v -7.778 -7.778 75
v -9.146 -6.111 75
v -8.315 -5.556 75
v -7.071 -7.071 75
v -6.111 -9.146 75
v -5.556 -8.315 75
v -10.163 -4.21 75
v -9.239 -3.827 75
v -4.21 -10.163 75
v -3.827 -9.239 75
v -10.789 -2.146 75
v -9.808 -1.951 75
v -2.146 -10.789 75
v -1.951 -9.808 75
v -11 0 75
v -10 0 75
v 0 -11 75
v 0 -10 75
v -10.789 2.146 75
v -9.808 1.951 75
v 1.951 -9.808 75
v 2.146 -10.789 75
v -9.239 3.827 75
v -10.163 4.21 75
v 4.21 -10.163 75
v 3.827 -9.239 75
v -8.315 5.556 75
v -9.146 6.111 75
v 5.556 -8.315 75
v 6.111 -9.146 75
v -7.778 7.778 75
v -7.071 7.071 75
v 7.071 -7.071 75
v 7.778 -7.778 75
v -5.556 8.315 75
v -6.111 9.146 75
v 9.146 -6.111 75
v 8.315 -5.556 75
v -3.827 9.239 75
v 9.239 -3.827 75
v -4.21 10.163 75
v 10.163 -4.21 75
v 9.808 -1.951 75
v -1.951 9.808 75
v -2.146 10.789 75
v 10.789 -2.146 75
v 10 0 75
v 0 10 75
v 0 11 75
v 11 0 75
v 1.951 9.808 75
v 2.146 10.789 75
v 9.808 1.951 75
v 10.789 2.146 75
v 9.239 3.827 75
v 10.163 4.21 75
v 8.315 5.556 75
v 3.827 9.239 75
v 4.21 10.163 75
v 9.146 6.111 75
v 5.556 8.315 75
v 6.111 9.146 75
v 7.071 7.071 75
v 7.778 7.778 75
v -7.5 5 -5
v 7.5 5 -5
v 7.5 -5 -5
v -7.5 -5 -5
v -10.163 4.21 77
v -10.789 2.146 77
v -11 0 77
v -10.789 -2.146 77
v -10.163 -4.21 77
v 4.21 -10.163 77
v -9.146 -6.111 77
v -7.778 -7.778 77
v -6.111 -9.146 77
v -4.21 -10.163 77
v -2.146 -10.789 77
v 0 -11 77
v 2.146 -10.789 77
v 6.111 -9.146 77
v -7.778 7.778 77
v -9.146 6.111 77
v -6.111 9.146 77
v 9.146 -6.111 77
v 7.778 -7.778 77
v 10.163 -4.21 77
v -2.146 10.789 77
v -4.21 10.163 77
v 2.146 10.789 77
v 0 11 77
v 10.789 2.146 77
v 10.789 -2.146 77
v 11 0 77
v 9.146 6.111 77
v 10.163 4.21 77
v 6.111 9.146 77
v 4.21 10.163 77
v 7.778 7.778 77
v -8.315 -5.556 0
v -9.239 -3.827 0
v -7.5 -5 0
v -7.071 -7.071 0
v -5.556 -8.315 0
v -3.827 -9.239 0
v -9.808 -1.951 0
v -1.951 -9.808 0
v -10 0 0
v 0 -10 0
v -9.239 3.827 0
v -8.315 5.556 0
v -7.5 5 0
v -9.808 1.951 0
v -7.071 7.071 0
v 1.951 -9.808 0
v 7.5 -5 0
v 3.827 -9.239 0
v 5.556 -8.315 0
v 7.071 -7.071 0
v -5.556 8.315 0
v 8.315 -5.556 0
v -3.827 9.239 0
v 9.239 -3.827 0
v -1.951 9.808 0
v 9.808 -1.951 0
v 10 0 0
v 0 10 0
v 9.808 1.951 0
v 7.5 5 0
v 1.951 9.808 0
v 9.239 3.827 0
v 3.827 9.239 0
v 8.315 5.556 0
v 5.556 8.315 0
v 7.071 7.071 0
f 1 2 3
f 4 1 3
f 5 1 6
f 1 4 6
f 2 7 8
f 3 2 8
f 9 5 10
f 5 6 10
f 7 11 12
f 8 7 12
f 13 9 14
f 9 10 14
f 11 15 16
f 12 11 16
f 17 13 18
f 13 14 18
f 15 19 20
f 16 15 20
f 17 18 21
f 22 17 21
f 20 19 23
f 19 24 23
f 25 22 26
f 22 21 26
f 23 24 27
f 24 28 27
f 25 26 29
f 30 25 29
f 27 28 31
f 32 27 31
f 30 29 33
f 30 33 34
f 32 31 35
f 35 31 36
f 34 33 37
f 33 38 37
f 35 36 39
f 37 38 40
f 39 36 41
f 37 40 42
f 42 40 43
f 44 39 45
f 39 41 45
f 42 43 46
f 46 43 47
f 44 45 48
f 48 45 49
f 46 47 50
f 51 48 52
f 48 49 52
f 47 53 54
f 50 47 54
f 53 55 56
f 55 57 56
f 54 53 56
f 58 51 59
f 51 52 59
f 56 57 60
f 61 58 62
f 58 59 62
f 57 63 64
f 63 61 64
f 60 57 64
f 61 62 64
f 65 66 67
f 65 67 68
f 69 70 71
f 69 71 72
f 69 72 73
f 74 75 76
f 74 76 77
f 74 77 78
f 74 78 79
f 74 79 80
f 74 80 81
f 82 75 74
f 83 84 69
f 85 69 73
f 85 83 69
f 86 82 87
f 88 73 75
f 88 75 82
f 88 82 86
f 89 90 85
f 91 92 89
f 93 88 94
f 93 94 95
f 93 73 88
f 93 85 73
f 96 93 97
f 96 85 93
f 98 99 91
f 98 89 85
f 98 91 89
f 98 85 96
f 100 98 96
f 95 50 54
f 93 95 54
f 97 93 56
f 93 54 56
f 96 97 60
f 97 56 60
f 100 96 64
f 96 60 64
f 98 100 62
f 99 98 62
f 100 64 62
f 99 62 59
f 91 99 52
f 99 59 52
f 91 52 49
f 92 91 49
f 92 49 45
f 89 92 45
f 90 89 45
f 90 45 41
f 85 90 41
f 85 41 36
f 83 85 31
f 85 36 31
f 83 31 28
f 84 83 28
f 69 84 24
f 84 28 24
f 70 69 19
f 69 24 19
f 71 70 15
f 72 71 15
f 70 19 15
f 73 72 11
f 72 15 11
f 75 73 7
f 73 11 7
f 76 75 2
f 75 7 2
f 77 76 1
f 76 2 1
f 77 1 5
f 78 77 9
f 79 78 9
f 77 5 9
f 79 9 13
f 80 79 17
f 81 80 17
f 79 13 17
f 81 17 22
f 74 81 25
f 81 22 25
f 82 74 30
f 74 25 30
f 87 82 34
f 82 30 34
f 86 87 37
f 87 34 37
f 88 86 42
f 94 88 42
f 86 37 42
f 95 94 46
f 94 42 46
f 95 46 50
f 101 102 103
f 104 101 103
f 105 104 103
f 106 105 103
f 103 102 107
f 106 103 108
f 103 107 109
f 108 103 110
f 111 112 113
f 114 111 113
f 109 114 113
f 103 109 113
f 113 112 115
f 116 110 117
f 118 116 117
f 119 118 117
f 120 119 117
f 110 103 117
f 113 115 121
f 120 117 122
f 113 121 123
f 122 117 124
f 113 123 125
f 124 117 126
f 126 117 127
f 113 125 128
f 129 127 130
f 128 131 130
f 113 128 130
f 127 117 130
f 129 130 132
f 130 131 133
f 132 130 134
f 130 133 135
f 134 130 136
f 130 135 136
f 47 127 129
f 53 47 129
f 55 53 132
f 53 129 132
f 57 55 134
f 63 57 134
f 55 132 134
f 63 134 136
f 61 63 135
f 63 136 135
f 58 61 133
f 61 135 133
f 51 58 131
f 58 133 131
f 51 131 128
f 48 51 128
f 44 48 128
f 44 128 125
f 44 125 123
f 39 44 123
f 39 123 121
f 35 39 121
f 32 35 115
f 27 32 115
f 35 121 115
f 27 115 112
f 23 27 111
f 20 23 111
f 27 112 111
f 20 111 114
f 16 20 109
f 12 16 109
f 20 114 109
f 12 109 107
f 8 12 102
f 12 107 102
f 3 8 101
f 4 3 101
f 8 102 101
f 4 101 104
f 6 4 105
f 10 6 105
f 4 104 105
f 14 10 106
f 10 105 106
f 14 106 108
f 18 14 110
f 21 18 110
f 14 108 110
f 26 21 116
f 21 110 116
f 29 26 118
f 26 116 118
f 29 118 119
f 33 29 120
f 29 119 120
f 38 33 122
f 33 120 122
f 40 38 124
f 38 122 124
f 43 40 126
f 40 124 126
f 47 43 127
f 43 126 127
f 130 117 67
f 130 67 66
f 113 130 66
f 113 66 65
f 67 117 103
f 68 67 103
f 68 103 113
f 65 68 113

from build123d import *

# Parameters (mm, degrees)
CROQUIS1_R              = 10
SALIENTE_EXTRUIR1_DEPTH = 75
CROQUIS2_R              = 11
SALIENTE_EXTRUIR2_DEPTH = 2
CROQUIS3_W              = 15
CROQUIS3_H              = 10
SALIENTE_EXTRUIR3_DEPTH = 5


with BuildPart() as part:
    # Croquis1 → Saliente-Extruir1 (new body)
    with BuildSketch(Plane.XY):
        Circle(CROQUIS1_R)
    extrude(amount=SALIENTE_EXTRUIR1_DEPTH)

    # Croquis2 → Saliente-Extruir2 (add)
    with BuildSketch(Plane.XY.offset(75)):
        Circle(CROQUIS2_R)
    extrude(amount=SALIENTE_EXTRUIR2_DEPTH)

    # Croquis3 → Saliente-Extruir3 (add)
    with BuildSketch(Plane(origin=(0, 0, 0), x_dir=(-1, 0, 0), z_dir=(0, 0, -1))):
        Rectangle(CROQUIS3_W, CROQUIS3_H)
    extrude(amount=SALIENTE_EXTRUIR3_DEPTH)


solid = part.part
